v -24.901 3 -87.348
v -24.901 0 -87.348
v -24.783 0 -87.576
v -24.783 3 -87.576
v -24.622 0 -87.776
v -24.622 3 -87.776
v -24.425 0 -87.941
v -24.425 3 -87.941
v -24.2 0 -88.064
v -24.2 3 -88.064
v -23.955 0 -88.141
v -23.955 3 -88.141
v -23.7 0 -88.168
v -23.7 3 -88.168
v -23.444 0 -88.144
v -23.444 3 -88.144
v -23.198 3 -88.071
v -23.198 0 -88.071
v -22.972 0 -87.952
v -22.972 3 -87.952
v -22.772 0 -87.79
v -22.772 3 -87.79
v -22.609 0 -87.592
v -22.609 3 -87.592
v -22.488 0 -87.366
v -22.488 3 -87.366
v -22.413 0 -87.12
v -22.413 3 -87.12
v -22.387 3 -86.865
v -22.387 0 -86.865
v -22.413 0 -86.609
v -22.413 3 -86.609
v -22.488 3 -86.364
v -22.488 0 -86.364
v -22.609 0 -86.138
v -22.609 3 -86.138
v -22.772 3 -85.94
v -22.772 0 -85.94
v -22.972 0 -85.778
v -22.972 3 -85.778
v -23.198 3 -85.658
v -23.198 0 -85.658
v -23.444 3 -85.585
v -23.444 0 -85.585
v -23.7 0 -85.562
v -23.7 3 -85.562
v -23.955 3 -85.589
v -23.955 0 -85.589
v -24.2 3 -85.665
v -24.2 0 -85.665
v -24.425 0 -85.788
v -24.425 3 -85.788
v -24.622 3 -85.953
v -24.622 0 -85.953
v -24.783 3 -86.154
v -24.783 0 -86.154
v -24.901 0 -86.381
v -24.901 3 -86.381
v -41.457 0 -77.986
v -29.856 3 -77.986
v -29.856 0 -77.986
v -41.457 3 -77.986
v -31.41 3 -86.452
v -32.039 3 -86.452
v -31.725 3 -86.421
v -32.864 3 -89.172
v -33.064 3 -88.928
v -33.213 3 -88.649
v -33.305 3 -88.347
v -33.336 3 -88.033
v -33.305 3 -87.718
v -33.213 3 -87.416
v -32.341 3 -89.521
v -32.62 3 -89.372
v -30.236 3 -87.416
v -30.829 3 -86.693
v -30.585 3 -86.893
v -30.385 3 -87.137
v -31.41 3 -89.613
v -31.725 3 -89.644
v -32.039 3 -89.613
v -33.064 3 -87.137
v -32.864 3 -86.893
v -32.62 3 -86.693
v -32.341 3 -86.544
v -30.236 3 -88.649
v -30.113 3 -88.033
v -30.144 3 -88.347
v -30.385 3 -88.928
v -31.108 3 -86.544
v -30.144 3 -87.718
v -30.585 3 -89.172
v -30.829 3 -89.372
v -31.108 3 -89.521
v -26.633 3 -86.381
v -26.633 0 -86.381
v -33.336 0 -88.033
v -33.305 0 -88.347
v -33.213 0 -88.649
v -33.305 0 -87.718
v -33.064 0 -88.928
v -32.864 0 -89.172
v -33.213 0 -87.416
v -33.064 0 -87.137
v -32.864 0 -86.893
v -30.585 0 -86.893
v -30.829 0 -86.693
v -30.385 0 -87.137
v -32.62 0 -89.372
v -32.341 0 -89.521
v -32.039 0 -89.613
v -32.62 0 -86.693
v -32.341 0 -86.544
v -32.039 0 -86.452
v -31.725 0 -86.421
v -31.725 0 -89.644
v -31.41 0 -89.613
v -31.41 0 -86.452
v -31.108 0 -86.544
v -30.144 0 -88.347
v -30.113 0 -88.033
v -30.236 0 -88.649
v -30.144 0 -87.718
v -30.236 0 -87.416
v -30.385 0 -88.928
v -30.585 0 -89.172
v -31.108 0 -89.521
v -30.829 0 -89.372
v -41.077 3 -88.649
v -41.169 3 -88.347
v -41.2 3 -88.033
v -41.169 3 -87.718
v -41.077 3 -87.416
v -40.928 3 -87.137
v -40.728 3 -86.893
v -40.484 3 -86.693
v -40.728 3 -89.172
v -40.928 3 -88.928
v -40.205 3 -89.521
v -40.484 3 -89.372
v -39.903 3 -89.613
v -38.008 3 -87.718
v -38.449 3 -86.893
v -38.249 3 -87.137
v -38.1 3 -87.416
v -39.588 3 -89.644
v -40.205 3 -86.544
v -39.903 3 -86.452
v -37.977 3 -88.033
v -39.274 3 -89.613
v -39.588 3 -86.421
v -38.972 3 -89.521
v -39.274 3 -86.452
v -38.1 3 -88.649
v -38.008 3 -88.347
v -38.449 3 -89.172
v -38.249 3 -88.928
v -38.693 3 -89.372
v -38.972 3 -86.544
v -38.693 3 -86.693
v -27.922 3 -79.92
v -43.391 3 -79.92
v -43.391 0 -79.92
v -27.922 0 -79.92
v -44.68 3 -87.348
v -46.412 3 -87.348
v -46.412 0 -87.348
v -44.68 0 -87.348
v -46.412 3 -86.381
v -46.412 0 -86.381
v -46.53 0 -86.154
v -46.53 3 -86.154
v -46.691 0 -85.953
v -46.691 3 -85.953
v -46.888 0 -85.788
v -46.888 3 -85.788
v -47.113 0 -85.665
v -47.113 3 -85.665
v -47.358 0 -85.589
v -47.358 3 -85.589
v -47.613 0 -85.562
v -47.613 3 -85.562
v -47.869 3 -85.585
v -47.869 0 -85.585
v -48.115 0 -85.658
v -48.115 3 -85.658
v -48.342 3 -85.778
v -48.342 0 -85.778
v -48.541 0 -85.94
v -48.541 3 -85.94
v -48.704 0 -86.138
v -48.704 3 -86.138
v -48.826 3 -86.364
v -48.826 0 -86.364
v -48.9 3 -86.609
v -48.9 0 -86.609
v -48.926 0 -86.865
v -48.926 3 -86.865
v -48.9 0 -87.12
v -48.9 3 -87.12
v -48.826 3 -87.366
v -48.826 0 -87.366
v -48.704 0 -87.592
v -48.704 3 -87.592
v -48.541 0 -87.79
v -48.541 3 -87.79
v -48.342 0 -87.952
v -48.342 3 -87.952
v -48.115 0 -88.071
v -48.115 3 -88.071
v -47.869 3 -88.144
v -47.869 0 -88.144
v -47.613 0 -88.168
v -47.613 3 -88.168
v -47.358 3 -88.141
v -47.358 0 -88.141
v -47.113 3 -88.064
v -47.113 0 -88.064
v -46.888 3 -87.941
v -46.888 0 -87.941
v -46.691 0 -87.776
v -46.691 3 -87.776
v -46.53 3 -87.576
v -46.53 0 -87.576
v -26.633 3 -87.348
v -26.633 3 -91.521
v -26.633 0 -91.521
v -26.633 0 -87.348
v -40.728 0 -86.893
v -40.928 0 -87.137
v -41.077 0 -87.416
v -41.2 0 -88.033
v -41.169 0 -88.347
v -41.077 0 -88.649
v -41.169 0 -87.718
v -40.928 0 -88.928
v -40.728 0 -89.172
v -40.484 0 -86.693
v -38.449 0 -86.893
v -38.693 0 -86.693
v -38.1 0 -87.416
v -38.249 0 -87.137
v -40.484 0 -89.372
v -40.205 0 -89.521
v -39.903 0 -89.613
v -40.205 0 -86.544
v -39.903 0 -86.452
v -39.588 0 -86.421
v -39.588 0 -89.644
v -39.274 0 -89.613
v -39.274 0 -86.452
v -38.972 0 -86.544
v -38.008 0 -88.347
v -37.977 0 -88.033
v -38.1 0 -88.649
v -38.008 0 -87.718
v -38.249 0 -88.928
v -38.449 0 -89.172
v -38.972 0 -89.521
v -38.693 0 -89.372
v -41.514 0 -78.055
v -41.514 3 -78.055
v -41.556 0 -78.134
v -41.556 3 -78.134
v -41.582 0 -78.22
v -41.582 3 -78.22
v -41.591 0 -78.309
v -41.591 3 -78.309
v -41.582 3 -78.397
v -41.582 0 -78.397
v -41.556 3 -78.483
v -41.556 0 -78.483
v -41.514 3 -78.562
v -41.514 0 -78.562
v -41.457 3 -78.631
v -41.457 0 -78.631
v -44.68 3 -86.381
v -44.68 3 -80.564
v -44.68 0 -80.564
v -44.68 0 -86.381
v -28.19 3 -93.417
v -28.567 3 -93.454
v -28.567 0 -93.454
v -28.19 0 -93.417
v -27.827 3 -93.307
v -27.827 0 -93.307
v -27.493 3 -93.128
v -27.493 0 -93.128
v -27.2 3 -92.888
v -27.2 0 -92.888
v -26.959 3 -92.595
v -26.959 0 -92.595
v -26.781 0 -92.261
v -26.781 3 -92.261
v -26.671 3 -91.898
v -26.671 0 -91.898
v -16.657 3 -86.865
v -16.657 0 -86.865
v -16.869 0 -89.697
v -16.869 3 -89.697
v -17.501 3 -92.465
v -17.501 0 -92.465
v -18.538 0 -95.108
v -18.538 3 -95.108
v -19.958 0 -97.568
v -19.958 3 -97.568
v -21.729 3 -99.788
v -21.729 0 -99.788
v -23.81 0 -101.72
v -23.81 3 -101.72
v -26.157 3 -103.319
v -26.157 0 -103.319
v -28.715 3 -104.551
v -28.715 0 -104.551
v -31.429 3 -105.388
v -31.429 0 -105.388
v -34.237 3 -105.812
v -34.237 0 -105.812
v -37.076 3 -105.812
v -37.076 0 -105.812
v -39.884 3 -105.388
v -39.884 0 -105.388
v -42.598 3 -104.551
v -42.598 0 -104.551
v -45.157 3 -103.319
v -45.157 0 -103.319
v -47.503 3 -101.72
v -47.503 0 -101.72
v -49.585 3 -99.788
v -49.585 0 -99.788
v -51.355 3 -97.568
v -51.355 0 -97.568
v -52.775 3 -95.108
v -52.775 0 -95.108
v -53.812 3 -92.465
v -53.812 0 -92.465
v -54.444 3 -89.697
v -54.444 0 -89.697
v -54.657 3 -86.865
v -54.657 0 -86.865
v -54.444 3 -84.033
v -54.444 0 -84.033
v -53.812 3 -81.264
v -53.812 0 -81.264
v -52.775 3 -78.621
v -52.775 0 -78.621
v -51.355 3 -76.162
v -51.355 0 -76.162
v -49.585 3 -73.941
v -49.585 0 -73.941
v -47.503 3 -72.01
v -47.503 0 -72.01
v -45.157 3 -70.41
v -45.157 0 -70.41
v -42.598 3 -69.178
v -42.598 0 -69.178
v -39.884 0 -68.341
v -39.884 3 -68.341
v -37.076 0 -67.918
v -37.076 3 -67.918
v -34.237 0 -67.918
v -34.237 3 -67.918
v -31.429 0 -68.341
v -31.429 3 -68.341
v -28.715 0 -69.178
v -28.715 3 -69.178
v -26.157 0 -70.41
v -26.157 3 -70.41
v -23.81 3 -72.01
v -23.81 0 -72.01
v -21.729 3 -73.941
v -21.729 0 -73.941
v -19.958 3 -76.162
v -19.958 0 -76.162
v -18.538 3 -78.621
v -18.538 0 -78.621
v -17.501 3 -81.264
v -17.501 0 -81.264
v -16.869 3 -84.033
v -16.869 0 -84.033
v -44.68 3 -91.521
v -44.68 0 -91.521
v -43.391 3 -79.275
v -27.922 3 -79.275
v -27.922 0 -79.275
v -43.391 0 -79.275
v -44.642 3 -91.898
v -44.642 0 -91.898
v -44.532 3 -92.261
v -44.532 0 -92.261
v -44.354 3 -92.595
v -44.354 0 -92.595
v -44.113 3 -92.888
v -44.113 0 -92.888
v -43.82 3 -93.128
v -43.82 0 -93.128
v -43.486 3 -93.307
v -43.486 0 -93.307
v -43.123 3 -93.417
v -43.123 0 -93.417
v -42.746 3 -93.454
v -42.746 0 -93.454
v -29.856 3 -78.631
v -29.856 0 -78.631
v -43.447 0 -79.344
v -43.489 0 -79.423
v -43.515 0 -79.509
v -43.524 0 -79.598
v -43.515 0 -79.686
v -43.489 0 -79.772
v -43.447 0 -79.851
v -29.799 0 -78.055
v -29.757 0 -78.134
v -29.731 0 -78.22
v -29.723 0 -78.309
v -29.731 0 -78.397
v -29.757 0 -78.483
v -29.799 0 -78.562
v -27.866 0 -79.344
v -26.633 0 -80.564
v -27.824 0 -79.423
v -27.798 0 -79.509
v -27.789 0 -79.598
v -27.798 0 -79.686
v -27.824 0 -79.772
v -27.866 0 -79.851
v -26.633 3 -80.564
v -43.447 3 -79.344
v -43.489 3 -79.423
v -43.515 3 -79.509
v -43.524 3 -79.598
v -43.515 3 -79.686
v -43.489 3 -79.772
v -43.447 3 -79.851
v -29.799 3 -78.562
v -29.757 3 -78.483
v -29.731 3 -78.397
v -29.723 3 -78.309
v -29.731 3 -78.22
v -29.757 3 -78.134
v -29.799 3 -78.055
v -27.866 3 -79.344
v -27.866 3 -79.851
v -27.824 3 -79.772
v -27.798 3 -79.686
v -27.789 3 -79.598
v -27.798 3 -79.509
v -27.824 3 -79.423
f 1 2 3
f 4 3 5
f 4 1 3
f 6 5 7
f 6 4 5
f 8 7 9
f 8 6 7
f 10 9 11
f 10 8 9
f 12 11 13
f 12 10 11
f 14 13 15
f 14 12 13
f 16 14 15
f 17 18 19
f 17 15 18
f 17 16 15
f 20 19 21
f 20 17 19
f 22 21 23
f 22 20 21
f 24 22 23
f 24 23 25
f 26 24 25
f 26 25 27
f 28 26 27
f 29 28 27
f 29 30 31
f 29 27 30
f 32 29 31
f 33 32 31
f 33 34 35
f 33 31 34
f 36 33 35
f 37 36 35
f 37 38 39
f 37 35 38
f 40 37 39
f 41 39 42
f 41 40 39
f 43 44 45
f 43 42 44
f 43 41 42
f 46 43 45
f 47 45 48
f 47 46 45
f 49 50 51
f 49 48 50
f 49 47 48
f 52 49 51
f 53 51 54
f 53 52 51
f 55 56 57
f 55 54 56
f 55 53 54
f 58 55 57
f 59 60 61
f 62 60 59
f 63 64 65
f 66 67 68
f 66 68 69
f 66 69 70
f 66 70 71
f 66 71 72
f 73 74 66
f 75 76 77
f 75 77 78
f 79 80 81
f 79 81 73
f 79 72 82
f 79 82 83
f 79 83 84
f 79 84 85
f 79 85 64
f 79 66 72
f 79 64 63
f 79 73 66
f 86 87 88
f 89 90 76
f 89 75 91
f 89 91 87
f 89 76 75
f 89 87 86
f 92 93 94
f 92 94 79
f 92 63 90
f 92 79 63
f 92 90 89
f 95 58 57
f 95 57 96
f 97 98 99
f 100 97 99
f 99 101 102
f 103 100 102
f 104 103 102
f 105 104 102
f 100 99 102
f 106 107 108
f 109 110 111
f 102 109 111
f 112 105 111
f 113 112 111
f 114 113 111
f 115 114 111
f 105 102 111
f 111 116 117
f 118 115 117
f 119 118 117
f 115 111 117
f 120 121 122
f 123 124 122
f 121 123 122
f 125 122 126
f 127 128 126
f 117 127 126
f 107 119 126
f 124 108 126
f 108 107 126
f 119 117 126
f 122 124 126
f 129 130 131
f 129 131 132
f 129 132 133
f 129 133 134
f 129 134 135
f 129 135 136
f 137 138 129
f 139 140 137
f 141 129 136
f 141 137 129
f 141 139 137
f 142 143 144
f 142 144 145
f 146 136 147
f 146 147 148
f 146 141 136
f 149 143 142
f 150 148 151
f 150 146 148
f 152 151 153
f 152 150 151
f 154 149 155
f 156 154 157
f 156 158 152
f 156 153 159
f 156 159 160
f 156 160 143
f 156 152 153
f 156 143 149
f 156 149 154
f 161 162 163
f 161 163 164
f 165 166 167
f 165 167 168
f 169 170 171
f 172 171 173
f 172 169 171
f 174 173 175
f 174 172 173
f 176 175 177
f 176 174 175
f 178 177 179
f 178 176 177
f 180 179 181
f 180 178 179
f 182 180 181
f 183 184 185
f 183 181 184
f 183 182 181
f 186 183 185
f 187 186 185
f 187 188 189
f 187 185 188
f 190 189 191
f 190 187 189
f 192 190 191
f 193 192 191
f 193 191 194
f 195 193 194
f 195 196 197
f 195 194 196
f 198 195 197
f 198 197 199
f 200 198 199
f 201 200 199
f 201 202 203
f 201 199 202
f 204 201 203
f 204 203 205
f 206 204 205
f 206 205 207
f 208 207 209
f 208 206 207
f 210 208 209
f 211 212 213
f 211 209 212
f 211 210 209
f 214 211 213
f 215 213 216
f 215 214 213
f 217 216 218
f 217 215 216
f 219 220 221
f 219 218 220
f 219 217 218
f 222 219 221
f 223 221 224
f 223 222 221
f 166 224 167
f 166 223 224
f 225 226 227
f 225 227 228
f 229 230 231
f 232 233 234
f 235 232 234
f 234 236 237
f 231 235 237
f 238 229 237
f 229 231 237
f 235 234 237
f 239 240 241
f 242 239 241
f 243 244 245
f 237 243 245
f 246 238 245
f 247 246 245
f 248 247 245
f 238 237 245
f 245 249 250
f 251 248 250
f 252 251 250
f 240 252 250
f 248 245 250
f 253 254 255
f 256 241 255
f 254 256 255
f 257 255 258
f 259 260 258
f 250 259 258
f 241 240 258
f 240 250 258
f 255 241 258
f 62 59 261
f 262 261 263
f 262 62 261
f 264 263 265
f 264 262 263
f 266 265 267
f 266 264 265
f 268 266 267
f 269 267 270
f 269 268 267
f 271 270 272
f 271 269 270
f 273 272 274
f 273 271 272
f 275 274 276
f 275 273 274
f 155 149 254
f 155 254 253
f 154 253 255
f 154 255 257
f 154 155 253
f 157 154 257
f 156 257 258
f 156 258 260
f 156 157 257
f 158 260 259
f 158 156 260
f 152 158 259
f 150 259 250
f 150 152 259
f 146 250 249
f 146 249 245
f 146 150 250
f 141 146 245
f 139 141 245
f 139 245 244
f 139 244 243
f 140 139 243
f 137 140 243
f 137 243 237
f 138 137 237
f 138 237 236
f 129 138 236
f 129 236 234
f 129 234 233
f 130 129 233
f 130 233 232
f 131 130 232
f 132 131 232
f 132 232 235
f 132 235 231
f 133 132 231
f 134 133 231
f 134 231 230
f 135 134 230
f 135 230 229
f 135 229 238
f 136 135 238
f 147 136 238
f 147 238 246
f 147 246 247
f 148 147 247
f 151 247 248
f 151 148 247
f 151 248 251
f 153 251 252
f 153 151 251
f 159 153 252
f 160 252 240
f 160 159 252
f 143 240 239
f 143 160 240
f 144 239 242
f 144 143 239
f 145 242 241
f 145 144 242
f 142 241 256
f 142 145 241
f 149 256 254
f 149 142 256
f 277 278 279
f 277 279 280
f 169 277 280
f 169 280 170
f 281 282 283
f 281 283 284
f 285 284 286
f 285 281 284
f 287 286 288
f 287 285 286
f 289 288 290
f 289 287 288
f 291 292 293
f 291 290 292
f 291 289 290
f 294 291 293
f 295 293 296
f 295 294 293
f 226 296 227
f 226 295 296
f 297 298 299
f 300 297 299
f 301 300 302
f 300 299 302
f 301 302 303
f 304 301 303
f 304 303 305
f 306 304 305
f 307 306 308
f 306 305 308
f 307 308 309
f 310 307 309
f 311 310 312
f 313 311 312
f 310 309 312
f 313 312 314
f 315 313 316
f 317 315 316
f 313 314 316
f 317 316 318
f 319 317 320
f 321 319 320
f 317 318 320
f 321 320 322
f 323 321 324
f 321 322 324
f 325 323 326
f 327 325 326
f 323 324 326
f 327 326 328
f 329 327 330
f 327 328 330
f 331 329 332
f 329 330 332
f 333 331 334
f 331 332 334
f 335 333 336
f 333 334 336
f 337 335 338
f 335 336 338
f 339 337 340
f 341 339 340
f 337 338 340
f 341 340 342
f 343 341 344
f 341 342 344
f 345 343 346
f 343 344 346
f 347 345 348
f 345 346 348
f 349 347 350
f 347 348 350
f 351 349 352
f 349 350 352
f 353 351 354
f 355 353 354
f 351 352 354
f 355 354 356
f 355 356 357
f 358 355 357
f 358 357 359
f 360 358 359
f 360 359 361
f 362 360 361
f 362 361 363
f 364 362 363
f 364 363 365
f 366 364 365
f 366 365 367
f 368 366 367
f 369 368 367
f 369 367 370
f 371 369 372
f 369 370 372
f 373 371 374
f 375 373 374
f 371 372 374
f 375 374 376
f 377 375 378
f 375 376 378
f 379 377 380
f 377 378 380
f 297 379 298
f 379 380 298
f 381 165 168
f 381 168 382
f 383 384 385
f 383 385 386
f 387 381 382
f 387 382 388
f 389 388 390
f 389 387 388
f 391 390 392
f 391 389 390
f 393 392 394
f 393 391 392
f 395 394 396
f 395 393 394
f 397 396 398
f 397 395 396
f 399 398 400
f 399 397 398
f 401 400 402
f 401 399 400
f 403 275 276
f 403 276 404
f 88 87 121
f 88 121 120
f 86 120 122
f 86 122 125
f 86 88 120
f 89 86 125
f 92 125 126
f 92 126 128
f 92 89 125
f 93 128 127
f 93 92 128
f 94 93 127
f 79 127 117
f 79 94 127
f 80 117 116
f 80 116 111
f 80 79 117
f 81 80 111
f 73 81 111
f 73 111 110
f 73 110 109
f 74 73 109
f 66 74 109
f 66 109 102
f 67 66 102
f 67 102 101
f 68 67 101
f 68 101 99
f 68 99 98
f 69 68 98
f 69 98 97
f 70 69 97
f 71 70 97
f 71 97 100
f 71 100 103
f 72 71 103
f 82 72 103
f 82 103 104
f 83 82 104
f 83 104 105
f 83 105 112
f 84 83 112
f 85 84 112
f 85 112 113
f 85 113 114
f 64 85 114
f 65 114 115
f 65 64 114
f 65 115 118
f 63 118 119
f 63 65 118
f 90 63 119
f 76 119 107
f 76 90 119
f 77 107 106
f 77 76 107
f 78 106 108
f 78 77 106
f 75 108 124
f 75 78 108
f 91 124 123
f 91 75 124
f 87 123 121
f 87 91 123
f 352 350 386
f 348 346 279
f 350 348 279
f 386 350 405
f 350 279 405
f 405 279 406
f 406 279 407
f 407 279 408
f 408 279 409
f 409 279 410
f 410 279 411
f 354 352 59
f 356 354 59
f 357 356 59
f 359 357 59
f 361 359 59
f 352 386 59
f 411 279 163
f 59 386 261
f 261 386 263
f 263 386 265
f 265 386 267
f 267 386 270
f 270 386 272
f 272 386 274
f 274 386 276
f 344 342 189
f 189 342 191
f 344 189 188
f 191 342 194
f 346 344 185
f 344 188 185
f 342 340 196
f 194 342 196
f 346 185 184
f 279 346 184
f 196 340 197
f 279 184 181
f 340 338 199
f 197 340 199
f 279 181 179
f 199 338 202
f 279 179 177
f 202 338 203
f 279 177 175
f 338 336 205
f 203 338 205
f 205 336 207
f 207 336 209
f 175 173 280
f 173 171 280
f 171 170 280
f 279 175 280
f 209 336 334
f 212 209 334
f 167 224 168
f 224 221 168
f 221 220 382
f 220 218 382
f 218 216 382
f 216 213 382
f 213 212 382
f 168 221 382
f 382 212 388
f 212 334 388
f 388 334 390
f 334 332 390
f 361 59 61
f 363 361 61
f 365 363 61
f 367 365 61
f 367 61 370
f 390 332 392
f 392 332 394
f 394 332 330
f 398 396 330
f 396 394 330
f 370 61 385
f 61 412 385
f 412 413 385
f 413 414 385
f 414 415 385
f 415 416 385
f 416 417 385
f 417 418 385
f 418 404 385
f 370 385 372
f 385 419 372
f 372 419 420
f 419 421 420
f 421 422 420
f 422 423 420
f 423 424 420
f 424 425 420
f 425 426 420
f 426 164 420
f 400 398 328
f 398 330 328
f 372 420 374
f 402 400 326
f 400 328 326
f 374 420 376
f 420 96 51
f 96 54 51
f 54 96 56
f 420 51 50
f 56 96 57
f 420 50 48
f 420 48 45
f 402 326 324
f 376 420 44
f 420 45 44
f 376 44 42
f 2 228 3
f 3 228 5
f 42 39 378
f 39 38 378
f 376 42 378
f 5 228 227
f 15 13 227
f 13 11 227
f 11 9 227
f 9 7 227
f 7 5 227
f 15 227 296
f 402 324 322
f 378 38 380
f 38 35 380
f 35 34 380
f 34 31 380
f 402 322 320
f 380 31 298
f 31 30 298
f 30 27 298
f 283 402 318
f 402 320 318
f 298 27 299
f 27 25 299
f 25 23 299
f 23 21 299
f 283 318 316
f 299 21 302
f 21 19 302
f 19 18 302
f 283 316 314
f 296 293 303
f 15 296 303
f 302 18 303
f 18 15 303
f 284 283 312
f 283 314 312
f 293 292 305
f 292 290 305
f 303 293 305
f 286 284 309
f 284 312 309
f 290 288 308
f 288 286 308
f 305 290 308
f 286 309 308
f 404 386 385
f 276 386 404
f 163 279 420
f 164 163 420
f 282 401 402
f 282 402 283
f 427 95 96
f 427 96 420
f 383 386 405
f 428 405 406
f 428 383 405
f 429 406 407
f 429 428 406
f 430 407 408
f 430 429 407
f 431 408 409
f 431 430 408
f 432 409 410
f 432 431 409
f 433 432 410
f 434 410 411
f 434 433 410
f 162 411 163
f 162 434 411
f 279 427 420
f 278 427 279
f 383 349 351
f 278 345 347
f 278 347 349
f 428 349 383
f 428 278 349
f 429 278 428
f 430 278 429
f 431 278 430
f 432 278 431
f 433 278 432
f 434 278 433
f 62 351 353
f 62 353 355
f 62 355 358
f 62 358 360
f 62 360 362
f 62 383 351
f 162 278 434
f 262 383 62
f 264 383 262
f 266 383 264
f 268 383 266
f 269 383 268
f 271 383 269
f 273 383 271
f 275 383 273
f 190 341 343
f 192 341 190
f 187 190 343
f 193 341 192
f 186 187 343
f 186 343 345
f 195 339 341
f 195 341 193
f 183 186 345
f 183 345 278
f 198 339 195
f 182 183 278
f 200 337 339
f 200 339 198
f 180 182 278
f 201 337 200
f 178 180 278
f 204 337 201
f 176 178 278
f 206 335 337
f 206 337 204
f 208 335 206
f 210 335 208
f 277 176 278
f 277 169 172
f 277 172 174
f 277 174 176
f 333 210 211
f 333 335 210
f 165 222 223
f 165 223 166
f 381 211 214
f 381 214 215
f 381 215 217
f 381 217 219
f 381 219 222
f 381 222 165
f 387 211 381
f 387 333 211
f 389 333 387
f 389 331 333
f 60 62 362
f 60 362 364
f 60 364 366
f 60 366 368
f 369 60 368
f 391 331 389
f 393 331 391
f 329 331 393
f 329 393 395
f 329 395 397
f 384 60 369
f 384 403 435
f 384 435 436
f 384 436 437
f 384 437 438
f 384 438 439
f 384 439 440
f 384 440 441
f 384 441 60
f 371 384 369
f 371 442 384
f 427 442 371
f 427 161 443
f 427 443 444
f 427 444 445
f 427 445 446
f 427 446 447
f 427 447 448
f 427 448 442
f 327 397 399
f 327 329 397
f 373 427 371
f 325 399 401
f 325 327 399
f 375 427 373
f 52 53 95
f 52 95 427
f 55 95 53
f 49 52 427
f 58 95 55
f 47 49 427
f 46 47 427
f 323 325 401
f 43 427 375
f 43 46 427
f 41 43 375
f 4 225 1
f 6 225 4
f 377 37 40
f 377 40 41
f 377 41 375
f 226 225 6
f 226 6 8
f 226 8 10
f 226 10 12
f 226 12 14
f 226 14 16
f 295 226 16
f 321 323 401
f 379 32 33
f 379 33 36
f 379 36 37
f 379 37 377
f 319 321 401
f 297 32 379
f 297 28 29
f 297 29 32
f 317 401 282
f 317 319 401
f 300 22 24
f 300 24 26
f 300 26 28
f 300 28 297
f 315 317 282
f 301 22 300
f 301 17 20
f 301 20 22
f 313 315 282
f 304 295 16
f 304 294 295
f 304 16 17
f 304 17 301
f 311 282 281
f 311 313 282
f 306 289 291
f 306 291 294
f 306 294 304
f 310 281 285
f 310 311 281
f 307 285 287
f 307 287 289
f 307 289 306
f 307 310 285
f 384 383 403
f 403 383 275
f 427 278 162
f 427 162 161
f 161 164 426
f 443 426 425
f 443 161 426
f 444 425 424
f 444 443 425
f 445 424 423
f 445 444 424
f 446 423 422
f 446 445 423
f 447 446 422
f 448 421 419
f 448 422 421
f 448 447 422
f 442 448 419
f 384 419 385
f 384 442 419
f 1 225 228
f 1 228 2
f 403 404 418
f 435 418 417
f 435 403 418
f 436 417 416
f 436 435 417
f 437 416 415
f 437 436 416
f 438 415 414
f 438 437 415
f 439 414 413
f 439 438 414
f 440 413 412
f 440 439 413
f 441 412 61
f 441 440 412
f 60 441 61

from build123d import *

# Parameters (mm, degrees)
SKETCH3_R           = 19
BOSS_EXTRUDE1_DEPTH = 3
SKETCH6_R           = 1.611255347
CUT_EXTRUDE1_DEPTH  = 4


with BuildPart() as part:
    # Sketch3 → Boss-Extrude1 (new body)
    with BuildSketch(Plane(origin=(0, 0, 0), x_dir=(1, 0, 0), z_dir=(0, 1, 0))):
        with Locations((-35.656522361, 86.864706092)):
            Circle(SKETCH3_R)
    extrude(amount=BOSS_EXTRUDE1_DEPTH)

    # Sketch6 → Cut-Extrude1 (cut, through all)
    with BuildSketch(Plane(origin=(0, 3, 0), x_dir=(1, 0, 0), z_dir=(0, 1, 0))):
        with BuildLine():
            Line((-44.679552304, 80.564265068), (-44.679552304, 86.381329488))
            Line((-44.679552304, 86.381329488), (-46.412185761, 86.381329488))
            ThreePointArc((-46.412185761, 86.381329488), (-48.925636161, 86.864706092), (-46.412185761, 87.348082696))
            Line((-46.412185761, 87.348082696), (-44.679552304, 87.348082696))
            Line((-44.679552304, 87.348082696), (-44.679552304, 91.520801428))
            ThreePointArc((-44.679552304, 91.520801428), (-44.113241386, 92.887996927), (-42.746045888, 93.454307845))
            Line((-42.746045888, 93.454307845), (-28.566998833, 93.454307845))
            ThreePointArc((-28.566998833, 93.454307845), (-27.199803335, 92.887996927), (-26.633492417, 91.520801428))
            Line((-26.633492417, 91.520801428), (-26.633492417, 87.348082696))
            Line((-26.633492417, 87.348082696), (-24.900858961, 87.348082696))
            ThreePointArc((-24.900858961, 87.348082696), (-22.38740856, 86.864706092), (-24.900858961, 86.381329488))
            Line((-24.900858961, 86.381329488), (-26.633492417, 86.381329488))
            Line((-26.633492417, 86.381329488), (-26.633492417, 80.564265068))
            Line((-26.633492417, 80.564265068), (-44.679552304, 80.564265068))
        make_face()
        with Locations((-39.588392261, 88.032660088)):
            Circle(SKETCH6_R, mode=Mode.SUBTRACT)
        with Locations((-31.72465246, 88.032660088)):
            Circle(SKETCH6_R, mode=Mode.SUBTRACT)
        with BuildLine():
            Line((-43.390548027, 79.919762929), (-27.922496694, 79.919762929))
            ThreePointArc((-27.922496694, 79.919762929), (-27.789015931, 79.597511859), (-27.922496694, 79.27526079))
            Line((-27.922496694, 79.27526079), (-43.390548027, 79.27526079))
            ThreePointArc((-43.390548027, 79.27526079), (-43.52402879, 79.597511859), (-43.390548027, 79.919762929))
        make_face()
        with BuildLine():
            Line((-41.45704161, 78.630758651), (-29.856003111, 78.630758651))
            ThreePointArc((-29.856003111, 78.630758651), (-29.722522348, 78.308507582), (-29.856003111, 77.986256512))
            Line((-29.856003111, 77.986256512), (-41.45704161, 77.986256512))
            ThreePointArc((-41.45704161, 77.986256512), (-41.590522374, 78.308507582), (-41.45704161, 78.630758651))
        make_face()
    extrude(amount=-CUT_EXTRUDE1_DEPTH, mode=Mode.SUBTRACT)


solid = part.part
